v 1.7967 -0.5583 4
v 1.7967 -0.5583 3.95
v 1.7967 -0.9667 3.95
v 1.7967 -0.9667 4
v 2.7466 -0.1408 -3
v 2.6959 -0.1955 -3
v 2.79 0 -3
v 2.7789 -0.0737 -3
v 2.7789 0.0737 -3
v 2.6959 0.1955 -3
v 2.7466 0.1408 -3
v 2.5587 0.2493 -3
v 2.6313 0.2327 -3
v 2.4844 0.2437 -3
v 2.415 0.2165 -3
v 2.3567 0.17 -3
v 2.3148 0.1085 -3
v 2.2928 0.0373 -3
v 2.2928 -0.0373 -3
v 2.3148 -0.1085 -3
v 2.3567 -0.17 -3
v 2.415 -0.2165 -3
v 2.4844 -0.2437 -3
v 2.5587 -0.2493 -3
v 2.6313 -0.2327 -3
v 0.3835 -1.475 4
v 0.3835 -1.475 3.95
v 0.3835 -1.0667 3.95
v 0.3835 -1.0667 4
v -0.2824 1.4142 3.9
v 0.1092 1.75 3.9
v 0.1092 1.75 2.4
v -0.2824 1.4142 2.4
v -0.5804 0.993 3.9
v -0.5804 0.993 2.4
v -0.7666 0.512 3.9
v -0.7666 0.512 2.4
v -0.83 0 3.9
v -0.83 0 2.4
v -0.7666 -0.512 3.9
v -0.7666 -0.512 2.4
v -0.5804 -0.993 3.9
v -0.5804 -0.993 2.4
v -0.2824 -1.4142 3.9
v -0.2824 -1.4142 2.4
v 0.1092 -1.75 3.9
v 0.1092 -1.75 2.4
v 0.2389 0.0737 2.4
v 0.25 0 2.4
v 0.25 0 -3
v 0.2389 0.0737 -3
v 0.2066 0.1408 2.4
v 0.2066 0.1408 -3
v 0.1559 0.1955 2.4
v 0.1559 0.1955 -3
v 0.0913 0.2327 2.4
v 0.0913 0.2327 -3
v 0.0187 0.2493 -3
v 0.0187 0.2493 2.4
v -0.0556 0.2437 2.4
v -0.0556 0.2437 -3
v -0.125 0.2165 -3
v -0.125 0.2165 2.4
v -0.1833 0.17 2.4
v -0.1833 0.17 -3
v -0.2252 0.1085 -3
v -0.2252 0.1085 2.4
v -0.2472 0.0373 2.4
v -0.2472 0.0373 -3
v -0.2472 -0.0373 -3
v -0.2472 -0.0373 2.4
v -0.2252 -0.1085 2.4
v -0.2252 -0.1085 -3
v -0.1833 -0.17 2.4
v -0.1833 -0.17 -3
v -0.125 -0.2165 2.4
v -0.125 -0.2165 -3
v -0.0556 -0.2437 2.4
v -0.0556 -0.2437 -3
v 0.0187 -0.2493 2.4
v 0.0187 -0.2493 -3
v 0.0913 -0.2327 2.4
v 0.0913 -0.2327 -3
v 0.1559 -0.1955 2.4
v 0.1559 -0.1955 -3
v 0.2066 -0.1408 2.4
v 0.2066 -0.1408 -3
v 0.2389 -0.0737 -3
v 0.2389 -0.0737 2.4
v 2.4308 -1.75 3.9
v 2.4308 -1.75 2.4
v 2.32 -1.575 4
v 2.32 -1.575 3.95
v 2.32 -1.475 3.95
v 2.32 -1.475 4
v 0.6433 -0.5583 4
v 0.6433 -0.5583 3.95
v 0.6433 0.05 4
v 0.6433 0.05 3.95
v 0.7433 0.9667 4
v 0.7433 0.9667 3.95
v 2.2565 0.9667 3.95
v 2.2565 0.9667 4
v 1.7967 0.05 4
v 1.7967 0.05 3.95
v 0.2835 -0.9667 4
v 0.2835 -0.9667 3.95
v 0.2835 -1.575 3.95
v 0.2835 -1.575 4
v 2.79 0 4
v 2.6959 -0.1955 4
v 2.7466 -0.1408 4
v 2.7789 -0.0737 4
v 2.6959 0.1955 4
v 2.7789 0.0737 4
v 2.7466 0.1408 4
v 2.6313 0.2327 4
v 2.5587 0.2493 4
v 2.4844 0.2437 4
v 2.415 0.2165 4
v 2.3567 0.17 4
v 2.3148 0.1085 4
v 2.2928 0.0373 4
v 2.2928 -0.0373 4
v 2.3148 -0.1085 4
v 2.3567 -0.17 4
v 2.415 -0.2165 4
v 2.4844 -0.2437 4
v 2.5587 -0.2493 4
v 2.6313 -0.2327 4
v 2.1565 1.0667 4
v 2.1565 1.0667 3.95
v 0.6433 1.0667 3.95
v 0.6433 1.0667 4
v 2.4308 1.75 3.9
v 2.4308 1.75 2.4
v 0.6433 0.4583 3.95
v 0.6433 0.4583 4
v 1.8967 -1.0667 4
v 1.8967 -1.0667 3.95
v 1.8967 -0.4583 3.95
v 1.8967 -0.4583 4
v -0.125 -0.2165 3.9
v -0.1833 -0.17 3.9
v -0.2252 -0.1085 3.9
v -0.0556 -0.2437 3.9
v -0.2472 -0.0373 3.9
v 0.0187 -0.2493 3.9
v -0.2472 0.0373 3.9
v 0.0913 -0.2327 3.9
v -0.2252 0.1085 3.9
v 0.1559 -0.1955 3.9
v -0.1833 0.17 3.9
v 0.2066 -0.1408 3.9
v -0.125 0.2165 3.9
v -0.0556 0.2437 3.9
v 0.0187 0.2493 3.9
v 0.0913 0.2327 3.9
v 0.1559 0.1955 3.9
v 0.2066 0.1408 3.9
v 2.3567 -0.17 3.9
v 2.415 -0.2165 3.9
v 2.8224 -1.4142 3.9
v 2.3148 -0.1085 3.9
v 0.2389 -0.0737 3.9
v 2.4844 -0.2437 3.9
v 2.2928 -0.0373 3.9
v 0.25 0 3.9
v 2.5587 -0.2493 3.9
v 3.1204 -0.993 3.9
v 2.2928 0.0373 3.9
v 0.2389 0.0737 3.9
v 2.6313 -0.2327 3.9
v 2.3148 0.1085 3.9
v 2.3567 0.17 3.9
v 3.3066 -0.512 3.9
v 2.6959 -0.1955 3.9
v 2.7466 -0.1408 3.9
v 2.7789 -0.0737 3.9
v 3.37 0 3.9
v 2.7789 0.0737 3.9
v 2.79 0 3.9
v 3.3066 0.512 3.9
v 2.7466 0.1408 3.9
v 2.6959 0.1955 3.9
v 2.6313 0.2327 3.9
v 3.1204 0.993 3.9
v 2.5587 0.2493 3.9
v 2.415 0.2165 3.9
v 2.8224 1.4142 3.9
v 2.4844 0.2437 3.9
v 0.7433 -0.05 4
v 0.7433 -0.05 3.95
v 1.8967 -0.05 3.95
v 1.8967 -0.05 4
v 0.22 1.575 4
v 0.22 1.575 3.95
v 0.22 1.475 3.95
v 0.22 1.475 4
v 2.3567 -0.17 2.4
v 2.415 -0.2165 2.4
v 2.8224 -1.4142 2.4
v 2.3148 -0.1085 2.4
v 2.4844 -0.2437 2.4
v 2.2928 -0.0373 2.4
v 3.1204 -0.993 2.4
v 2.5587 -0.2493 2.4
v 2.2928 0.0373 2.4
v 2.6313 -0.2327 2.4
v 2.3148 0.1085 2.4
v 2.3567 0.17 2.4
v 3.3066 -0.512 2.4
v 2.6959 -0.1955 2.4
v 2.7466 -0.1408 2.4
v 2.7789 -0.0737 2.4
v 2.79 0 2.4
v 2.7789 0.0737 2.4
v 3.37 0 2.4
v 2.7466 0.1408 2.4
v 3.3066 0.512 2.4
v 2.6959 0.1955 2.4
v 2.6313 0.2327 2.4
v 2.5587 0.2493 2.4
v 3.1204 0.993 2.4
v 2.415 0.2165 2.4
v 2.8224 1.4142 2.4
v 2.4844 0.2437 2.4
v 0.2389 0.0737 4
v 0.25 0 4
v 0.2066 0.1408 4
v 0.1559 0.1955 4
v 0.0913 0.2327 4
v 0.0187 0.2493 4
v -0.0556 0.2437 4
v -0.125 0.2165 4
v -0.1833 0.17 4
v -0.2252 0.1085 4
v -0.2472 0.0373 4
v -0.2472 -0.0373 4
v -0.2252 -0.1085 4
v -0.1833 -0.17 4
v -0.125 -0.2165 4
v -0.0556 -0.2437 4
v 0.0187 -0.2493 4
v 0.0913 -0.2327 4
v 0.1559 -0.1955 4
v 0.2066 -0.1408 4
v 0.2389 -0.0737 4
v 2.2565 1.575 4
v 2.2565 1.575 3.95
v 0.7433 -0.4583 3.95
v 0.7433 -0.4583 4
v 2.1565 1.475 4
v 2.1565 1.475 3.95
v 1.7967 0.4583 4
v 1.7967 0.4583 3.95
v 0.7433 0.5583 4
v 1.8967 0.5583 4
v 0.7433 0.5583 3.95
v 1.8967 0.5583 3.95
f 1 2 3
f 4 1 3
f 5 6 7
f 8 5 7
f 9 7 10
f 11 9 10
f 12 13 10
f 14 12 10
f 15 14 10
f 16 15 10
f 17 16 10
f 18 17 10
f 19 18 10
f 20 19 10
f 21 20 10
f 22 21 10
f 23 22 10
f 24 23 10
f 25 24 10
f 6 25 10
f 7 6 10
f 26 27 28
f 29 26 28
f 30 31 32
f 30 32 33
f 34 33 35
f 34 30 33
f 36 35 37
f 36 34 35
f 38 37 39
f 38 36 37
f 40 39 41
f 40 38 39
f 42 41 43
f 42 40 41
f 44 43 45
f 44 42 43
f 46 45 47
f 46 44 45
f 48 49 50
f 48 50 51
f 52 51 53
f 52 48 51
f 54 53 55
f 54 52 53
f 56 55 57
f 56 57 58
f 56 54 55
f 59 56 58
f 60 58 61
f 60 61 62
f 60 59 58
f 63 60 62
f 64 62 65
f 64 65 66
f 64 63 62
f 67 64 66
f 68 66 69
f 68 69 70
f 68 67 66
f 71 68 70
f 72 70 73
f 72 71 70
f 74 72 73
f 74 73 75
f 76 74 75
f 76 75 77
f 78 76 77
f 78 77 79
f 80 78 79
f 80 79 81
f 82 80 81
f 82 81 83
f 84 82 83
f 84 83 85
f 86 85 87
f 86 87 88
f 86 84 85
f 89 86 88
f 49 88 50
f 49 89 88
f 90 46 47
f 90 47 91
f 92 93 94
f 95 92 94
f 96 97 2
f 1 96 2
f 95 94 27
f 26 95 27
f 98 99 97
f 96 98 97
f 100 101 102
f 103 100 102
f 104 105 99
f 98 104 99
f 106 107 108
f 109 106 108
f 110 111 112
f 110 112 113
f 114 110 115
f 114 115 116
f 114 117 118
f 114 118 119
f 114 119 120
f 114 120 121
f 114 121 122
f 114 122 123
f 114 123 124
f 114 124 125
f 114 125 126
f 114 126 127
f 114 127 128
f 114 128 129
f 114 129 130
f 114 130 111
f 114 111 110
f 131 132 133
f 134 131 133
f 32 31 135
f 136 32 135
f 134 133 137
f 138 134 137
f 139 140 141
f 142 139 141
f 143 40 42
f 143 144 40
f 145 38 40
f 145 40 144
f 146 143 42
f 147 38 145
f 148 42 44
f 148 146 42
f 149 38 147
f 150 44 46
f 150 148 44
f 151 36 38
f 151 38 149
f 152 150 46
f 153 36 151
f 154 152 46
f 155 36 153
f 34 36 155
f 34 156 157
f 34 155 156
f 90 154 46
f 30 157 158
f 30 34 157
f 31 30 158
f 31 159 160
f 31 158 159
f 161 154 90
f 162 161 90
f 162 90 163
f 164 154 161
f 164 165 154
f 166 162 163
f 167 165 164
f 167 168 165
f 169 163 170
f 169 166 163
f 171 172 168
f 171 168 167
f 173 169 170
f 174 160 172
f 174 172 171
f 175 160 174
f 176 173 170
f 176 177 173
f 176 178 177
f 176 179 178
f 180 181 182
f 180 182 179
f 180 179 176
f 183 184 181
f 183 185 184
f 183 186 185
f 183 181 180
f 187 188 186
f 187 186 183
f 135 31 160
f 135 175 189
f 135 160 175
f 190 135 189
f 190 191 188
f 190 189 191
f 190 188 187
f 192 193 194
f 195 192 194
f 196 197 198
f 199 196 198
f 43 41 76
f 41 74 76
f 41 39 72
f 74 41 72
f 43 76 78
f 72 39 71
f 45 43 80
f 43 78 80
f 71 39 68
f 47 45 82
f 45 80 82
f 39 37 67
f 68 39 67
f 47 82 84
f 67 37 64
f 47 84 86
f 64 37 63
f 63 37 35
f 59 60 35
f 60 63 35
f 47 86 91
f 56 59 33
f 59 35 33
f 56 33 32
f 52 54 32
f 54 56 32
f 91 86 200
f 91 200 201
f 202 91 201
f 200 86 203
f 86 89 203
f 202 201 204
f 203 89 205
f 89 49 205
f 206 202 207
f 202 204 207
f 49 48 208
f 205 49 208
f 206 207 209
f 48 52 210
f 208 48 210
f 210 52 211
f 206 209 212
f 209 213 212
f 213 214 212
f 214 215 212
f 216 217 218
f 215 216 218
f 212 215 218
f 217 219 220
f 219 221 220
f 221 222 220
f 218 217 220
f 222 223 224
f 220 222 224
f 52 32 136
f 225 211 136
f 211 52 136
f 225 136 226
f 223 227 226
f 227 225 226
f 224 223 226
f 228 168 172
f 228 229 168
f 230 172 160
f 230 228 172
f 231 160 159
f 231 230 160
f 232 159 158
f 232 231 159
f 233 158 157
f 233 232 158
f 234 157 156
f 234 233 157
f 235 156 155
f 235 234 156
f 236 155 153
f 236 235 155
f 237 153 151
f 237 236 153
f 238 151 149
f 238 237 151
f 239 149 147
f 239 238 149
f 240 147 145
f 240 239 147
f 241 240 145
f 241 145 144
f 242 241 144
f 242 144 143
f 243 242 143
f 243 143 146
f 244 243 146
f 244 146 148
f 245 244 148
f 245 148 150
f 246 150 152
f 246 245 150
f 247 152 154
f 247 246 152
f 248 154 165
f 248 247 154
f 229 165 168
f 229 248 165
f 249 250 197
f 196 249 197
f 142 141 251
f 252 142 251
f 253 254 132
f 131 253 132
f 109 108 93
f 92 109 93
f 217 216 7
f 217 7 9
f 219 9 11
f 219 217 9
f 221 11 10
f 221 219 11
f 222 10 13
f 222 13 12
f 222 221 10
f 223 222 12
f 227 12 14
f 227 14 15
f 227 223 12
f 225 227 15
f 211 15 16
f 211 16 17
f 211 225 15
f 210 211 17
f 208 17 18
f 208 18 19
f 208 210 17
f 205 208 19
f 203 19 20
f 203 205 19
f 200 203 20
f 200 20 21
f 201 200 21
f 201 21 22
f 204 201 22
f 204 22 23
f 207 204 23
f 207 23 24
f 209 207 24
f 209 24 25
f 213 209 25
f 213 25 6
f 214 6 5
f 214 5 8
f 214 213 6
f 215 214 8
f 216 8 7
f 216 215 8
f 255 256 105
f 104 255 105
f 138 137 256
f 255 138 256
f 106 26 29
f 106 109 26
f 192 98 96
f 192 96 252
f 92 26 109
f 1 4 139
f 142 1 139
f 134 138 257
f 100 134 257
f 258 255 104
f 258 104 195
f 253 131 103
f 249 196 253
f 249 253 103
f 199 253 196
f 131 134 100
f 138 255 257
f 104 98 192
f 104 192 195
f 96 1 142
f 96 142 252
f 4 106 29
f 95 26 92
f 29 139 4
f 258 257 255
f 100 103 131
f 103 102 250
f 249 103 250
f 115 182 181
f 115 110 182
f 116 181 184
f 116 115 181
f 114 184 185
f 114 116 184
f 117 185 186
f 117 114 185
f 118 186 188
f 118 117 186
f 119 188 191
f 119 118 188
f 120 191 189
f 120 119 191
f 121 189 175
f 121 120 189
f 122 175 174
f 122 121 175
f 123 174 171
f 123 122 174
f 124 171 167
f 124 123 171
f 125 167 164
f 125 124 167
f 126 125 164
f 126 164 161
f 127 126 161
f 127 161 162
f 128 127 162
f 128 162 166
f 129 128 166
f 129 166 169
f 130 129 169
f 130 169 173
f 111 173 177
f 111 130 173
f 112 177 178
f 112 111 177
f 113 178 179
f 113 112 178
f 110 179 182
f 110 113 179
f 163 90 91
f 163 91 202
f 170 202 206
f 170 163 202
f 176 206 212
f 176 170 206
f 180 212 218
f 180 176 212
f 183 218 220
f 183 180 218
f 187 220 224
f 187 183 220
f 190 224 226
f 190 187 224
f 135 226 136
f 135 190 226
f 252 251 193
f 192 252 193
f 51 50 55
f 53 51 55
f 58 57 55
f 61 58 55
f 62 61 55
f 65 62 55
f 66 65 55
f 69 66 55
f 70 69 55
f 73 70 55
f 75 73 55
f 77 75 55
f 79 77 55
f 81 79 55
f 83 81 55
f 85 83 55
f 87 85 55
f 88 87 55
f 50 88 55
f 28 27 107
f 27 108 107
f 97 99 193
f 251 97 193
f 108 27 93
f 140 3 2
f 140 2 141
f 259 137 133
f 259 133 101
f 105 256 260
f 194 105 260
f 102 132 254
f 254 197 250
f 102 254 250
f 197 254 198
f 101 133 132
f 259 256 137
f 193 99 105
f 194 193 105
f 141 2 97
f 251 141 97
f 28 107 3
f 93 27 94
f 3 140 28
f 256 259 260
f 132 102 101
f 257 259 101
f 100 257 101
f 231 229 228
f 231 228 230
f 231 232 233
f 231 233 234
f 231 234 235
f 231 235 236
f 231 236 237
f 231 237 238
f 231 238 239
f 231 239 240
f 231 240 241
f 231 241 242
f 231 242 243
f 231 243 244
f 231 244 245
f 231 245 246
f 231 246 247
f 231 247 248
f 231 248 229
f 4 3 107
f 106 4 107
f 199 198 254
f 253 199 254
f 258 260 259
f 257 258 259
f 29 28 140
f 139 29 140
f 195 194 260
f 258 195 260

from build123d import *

# Parameters (mm, degrees)
PAD001_DEPTH   = 1.5
SKETCH_R       = 0.25
PAD_DEPTH      = 4
PAD_DEPTH_BACK = 3
PAD002_DEPTH   = 0.05


with BuildPart() as pad001:
    # Sketch001 → Pad001 (new body)
    with BuildSketch(Plane.XY.offset(3.9)):
        with BuildLine():
            ThreePointArc((0.109181, 1.75), (-0.83, 0), (0.109181, -1.75))
            Line((0.109181, -1.75), (2.430819, -1.75))
            ThreePointArc((2.430819, -1.75), (3.37, 0), (2.430819, 1.75))
            Line((0.109181, 1.75), (2.430819, 1.75))
        make_face()
    extrude(amount=-PAD001_DEPTH)


with BuildPart() as pad:
    # Sketch → Pad (new body, two sides)
    with BuildSketch(Plane.XY) as pad_sk:
        Circle(SKETCH_R)
        with Locations((2.54, 0)):
            Circle(SKETCH_R)
    extrude(amount=PAD_DEPTH)
    extrude(pad_sk.sketch, amount=-PAD_DEPTH_BACK)


with BuildPart() as r_ldr_4_2x3_5mm_p2_54mm_vertical:
    # Sketch002 → Pad002 (new body)
    with BuildSketch(Plane.XY.offset(3.95)):
        Polygon((0.22, 1.475), (2.1565, 1.475), (2.1565, 1.066667), (0.643333, 1.066667), (0.643333, 0.966667), (0.643333, 0.458333), (0.743333, 0.458333), (1.796667, 0.458333), (1.796667, 0.05), (0.643333, 0.05), (0.643333, -0.05), (0.643333, -0.558333), (0.743333, -0.558333), (1.796667, -0.558333), (1.796667, -0.966667), (0.2835, -0.966667), (0.2835, -1.066667), (0.2835, -1.575), (0.3835, -1.575), (2.32, -1.575), (2.32, -1.475), (0.3835, -1.475), (0.3835, -1.066667), (1.796667, -1.066667), (1.896667, -1.066667), (1.896667, -0.558333), (1.896667, -0.458333), (0.743333, -0.458333), (0.743333, -0.05), (1.796667, -0.05), (1.896667, -0.05), (1.896667, 0.458333), (1.896667, 0.558333), (0.743333, 0.558333), (0.743333, 0.966667), (2.1565, 0.966667), (2.2565, 0.966667), (2.2565, 1.475), (2.2565, 1.575), (0.22, 1.575), align=None)
    extrude(amount=PAD002_DEPTH)

    # Pad002_mp_cp: union Pad001, Pad
    add(pad001.part)
    add(pad.part)


solid = r_ldr_4_2x3_5mm_p2_54mm_vertical.part
